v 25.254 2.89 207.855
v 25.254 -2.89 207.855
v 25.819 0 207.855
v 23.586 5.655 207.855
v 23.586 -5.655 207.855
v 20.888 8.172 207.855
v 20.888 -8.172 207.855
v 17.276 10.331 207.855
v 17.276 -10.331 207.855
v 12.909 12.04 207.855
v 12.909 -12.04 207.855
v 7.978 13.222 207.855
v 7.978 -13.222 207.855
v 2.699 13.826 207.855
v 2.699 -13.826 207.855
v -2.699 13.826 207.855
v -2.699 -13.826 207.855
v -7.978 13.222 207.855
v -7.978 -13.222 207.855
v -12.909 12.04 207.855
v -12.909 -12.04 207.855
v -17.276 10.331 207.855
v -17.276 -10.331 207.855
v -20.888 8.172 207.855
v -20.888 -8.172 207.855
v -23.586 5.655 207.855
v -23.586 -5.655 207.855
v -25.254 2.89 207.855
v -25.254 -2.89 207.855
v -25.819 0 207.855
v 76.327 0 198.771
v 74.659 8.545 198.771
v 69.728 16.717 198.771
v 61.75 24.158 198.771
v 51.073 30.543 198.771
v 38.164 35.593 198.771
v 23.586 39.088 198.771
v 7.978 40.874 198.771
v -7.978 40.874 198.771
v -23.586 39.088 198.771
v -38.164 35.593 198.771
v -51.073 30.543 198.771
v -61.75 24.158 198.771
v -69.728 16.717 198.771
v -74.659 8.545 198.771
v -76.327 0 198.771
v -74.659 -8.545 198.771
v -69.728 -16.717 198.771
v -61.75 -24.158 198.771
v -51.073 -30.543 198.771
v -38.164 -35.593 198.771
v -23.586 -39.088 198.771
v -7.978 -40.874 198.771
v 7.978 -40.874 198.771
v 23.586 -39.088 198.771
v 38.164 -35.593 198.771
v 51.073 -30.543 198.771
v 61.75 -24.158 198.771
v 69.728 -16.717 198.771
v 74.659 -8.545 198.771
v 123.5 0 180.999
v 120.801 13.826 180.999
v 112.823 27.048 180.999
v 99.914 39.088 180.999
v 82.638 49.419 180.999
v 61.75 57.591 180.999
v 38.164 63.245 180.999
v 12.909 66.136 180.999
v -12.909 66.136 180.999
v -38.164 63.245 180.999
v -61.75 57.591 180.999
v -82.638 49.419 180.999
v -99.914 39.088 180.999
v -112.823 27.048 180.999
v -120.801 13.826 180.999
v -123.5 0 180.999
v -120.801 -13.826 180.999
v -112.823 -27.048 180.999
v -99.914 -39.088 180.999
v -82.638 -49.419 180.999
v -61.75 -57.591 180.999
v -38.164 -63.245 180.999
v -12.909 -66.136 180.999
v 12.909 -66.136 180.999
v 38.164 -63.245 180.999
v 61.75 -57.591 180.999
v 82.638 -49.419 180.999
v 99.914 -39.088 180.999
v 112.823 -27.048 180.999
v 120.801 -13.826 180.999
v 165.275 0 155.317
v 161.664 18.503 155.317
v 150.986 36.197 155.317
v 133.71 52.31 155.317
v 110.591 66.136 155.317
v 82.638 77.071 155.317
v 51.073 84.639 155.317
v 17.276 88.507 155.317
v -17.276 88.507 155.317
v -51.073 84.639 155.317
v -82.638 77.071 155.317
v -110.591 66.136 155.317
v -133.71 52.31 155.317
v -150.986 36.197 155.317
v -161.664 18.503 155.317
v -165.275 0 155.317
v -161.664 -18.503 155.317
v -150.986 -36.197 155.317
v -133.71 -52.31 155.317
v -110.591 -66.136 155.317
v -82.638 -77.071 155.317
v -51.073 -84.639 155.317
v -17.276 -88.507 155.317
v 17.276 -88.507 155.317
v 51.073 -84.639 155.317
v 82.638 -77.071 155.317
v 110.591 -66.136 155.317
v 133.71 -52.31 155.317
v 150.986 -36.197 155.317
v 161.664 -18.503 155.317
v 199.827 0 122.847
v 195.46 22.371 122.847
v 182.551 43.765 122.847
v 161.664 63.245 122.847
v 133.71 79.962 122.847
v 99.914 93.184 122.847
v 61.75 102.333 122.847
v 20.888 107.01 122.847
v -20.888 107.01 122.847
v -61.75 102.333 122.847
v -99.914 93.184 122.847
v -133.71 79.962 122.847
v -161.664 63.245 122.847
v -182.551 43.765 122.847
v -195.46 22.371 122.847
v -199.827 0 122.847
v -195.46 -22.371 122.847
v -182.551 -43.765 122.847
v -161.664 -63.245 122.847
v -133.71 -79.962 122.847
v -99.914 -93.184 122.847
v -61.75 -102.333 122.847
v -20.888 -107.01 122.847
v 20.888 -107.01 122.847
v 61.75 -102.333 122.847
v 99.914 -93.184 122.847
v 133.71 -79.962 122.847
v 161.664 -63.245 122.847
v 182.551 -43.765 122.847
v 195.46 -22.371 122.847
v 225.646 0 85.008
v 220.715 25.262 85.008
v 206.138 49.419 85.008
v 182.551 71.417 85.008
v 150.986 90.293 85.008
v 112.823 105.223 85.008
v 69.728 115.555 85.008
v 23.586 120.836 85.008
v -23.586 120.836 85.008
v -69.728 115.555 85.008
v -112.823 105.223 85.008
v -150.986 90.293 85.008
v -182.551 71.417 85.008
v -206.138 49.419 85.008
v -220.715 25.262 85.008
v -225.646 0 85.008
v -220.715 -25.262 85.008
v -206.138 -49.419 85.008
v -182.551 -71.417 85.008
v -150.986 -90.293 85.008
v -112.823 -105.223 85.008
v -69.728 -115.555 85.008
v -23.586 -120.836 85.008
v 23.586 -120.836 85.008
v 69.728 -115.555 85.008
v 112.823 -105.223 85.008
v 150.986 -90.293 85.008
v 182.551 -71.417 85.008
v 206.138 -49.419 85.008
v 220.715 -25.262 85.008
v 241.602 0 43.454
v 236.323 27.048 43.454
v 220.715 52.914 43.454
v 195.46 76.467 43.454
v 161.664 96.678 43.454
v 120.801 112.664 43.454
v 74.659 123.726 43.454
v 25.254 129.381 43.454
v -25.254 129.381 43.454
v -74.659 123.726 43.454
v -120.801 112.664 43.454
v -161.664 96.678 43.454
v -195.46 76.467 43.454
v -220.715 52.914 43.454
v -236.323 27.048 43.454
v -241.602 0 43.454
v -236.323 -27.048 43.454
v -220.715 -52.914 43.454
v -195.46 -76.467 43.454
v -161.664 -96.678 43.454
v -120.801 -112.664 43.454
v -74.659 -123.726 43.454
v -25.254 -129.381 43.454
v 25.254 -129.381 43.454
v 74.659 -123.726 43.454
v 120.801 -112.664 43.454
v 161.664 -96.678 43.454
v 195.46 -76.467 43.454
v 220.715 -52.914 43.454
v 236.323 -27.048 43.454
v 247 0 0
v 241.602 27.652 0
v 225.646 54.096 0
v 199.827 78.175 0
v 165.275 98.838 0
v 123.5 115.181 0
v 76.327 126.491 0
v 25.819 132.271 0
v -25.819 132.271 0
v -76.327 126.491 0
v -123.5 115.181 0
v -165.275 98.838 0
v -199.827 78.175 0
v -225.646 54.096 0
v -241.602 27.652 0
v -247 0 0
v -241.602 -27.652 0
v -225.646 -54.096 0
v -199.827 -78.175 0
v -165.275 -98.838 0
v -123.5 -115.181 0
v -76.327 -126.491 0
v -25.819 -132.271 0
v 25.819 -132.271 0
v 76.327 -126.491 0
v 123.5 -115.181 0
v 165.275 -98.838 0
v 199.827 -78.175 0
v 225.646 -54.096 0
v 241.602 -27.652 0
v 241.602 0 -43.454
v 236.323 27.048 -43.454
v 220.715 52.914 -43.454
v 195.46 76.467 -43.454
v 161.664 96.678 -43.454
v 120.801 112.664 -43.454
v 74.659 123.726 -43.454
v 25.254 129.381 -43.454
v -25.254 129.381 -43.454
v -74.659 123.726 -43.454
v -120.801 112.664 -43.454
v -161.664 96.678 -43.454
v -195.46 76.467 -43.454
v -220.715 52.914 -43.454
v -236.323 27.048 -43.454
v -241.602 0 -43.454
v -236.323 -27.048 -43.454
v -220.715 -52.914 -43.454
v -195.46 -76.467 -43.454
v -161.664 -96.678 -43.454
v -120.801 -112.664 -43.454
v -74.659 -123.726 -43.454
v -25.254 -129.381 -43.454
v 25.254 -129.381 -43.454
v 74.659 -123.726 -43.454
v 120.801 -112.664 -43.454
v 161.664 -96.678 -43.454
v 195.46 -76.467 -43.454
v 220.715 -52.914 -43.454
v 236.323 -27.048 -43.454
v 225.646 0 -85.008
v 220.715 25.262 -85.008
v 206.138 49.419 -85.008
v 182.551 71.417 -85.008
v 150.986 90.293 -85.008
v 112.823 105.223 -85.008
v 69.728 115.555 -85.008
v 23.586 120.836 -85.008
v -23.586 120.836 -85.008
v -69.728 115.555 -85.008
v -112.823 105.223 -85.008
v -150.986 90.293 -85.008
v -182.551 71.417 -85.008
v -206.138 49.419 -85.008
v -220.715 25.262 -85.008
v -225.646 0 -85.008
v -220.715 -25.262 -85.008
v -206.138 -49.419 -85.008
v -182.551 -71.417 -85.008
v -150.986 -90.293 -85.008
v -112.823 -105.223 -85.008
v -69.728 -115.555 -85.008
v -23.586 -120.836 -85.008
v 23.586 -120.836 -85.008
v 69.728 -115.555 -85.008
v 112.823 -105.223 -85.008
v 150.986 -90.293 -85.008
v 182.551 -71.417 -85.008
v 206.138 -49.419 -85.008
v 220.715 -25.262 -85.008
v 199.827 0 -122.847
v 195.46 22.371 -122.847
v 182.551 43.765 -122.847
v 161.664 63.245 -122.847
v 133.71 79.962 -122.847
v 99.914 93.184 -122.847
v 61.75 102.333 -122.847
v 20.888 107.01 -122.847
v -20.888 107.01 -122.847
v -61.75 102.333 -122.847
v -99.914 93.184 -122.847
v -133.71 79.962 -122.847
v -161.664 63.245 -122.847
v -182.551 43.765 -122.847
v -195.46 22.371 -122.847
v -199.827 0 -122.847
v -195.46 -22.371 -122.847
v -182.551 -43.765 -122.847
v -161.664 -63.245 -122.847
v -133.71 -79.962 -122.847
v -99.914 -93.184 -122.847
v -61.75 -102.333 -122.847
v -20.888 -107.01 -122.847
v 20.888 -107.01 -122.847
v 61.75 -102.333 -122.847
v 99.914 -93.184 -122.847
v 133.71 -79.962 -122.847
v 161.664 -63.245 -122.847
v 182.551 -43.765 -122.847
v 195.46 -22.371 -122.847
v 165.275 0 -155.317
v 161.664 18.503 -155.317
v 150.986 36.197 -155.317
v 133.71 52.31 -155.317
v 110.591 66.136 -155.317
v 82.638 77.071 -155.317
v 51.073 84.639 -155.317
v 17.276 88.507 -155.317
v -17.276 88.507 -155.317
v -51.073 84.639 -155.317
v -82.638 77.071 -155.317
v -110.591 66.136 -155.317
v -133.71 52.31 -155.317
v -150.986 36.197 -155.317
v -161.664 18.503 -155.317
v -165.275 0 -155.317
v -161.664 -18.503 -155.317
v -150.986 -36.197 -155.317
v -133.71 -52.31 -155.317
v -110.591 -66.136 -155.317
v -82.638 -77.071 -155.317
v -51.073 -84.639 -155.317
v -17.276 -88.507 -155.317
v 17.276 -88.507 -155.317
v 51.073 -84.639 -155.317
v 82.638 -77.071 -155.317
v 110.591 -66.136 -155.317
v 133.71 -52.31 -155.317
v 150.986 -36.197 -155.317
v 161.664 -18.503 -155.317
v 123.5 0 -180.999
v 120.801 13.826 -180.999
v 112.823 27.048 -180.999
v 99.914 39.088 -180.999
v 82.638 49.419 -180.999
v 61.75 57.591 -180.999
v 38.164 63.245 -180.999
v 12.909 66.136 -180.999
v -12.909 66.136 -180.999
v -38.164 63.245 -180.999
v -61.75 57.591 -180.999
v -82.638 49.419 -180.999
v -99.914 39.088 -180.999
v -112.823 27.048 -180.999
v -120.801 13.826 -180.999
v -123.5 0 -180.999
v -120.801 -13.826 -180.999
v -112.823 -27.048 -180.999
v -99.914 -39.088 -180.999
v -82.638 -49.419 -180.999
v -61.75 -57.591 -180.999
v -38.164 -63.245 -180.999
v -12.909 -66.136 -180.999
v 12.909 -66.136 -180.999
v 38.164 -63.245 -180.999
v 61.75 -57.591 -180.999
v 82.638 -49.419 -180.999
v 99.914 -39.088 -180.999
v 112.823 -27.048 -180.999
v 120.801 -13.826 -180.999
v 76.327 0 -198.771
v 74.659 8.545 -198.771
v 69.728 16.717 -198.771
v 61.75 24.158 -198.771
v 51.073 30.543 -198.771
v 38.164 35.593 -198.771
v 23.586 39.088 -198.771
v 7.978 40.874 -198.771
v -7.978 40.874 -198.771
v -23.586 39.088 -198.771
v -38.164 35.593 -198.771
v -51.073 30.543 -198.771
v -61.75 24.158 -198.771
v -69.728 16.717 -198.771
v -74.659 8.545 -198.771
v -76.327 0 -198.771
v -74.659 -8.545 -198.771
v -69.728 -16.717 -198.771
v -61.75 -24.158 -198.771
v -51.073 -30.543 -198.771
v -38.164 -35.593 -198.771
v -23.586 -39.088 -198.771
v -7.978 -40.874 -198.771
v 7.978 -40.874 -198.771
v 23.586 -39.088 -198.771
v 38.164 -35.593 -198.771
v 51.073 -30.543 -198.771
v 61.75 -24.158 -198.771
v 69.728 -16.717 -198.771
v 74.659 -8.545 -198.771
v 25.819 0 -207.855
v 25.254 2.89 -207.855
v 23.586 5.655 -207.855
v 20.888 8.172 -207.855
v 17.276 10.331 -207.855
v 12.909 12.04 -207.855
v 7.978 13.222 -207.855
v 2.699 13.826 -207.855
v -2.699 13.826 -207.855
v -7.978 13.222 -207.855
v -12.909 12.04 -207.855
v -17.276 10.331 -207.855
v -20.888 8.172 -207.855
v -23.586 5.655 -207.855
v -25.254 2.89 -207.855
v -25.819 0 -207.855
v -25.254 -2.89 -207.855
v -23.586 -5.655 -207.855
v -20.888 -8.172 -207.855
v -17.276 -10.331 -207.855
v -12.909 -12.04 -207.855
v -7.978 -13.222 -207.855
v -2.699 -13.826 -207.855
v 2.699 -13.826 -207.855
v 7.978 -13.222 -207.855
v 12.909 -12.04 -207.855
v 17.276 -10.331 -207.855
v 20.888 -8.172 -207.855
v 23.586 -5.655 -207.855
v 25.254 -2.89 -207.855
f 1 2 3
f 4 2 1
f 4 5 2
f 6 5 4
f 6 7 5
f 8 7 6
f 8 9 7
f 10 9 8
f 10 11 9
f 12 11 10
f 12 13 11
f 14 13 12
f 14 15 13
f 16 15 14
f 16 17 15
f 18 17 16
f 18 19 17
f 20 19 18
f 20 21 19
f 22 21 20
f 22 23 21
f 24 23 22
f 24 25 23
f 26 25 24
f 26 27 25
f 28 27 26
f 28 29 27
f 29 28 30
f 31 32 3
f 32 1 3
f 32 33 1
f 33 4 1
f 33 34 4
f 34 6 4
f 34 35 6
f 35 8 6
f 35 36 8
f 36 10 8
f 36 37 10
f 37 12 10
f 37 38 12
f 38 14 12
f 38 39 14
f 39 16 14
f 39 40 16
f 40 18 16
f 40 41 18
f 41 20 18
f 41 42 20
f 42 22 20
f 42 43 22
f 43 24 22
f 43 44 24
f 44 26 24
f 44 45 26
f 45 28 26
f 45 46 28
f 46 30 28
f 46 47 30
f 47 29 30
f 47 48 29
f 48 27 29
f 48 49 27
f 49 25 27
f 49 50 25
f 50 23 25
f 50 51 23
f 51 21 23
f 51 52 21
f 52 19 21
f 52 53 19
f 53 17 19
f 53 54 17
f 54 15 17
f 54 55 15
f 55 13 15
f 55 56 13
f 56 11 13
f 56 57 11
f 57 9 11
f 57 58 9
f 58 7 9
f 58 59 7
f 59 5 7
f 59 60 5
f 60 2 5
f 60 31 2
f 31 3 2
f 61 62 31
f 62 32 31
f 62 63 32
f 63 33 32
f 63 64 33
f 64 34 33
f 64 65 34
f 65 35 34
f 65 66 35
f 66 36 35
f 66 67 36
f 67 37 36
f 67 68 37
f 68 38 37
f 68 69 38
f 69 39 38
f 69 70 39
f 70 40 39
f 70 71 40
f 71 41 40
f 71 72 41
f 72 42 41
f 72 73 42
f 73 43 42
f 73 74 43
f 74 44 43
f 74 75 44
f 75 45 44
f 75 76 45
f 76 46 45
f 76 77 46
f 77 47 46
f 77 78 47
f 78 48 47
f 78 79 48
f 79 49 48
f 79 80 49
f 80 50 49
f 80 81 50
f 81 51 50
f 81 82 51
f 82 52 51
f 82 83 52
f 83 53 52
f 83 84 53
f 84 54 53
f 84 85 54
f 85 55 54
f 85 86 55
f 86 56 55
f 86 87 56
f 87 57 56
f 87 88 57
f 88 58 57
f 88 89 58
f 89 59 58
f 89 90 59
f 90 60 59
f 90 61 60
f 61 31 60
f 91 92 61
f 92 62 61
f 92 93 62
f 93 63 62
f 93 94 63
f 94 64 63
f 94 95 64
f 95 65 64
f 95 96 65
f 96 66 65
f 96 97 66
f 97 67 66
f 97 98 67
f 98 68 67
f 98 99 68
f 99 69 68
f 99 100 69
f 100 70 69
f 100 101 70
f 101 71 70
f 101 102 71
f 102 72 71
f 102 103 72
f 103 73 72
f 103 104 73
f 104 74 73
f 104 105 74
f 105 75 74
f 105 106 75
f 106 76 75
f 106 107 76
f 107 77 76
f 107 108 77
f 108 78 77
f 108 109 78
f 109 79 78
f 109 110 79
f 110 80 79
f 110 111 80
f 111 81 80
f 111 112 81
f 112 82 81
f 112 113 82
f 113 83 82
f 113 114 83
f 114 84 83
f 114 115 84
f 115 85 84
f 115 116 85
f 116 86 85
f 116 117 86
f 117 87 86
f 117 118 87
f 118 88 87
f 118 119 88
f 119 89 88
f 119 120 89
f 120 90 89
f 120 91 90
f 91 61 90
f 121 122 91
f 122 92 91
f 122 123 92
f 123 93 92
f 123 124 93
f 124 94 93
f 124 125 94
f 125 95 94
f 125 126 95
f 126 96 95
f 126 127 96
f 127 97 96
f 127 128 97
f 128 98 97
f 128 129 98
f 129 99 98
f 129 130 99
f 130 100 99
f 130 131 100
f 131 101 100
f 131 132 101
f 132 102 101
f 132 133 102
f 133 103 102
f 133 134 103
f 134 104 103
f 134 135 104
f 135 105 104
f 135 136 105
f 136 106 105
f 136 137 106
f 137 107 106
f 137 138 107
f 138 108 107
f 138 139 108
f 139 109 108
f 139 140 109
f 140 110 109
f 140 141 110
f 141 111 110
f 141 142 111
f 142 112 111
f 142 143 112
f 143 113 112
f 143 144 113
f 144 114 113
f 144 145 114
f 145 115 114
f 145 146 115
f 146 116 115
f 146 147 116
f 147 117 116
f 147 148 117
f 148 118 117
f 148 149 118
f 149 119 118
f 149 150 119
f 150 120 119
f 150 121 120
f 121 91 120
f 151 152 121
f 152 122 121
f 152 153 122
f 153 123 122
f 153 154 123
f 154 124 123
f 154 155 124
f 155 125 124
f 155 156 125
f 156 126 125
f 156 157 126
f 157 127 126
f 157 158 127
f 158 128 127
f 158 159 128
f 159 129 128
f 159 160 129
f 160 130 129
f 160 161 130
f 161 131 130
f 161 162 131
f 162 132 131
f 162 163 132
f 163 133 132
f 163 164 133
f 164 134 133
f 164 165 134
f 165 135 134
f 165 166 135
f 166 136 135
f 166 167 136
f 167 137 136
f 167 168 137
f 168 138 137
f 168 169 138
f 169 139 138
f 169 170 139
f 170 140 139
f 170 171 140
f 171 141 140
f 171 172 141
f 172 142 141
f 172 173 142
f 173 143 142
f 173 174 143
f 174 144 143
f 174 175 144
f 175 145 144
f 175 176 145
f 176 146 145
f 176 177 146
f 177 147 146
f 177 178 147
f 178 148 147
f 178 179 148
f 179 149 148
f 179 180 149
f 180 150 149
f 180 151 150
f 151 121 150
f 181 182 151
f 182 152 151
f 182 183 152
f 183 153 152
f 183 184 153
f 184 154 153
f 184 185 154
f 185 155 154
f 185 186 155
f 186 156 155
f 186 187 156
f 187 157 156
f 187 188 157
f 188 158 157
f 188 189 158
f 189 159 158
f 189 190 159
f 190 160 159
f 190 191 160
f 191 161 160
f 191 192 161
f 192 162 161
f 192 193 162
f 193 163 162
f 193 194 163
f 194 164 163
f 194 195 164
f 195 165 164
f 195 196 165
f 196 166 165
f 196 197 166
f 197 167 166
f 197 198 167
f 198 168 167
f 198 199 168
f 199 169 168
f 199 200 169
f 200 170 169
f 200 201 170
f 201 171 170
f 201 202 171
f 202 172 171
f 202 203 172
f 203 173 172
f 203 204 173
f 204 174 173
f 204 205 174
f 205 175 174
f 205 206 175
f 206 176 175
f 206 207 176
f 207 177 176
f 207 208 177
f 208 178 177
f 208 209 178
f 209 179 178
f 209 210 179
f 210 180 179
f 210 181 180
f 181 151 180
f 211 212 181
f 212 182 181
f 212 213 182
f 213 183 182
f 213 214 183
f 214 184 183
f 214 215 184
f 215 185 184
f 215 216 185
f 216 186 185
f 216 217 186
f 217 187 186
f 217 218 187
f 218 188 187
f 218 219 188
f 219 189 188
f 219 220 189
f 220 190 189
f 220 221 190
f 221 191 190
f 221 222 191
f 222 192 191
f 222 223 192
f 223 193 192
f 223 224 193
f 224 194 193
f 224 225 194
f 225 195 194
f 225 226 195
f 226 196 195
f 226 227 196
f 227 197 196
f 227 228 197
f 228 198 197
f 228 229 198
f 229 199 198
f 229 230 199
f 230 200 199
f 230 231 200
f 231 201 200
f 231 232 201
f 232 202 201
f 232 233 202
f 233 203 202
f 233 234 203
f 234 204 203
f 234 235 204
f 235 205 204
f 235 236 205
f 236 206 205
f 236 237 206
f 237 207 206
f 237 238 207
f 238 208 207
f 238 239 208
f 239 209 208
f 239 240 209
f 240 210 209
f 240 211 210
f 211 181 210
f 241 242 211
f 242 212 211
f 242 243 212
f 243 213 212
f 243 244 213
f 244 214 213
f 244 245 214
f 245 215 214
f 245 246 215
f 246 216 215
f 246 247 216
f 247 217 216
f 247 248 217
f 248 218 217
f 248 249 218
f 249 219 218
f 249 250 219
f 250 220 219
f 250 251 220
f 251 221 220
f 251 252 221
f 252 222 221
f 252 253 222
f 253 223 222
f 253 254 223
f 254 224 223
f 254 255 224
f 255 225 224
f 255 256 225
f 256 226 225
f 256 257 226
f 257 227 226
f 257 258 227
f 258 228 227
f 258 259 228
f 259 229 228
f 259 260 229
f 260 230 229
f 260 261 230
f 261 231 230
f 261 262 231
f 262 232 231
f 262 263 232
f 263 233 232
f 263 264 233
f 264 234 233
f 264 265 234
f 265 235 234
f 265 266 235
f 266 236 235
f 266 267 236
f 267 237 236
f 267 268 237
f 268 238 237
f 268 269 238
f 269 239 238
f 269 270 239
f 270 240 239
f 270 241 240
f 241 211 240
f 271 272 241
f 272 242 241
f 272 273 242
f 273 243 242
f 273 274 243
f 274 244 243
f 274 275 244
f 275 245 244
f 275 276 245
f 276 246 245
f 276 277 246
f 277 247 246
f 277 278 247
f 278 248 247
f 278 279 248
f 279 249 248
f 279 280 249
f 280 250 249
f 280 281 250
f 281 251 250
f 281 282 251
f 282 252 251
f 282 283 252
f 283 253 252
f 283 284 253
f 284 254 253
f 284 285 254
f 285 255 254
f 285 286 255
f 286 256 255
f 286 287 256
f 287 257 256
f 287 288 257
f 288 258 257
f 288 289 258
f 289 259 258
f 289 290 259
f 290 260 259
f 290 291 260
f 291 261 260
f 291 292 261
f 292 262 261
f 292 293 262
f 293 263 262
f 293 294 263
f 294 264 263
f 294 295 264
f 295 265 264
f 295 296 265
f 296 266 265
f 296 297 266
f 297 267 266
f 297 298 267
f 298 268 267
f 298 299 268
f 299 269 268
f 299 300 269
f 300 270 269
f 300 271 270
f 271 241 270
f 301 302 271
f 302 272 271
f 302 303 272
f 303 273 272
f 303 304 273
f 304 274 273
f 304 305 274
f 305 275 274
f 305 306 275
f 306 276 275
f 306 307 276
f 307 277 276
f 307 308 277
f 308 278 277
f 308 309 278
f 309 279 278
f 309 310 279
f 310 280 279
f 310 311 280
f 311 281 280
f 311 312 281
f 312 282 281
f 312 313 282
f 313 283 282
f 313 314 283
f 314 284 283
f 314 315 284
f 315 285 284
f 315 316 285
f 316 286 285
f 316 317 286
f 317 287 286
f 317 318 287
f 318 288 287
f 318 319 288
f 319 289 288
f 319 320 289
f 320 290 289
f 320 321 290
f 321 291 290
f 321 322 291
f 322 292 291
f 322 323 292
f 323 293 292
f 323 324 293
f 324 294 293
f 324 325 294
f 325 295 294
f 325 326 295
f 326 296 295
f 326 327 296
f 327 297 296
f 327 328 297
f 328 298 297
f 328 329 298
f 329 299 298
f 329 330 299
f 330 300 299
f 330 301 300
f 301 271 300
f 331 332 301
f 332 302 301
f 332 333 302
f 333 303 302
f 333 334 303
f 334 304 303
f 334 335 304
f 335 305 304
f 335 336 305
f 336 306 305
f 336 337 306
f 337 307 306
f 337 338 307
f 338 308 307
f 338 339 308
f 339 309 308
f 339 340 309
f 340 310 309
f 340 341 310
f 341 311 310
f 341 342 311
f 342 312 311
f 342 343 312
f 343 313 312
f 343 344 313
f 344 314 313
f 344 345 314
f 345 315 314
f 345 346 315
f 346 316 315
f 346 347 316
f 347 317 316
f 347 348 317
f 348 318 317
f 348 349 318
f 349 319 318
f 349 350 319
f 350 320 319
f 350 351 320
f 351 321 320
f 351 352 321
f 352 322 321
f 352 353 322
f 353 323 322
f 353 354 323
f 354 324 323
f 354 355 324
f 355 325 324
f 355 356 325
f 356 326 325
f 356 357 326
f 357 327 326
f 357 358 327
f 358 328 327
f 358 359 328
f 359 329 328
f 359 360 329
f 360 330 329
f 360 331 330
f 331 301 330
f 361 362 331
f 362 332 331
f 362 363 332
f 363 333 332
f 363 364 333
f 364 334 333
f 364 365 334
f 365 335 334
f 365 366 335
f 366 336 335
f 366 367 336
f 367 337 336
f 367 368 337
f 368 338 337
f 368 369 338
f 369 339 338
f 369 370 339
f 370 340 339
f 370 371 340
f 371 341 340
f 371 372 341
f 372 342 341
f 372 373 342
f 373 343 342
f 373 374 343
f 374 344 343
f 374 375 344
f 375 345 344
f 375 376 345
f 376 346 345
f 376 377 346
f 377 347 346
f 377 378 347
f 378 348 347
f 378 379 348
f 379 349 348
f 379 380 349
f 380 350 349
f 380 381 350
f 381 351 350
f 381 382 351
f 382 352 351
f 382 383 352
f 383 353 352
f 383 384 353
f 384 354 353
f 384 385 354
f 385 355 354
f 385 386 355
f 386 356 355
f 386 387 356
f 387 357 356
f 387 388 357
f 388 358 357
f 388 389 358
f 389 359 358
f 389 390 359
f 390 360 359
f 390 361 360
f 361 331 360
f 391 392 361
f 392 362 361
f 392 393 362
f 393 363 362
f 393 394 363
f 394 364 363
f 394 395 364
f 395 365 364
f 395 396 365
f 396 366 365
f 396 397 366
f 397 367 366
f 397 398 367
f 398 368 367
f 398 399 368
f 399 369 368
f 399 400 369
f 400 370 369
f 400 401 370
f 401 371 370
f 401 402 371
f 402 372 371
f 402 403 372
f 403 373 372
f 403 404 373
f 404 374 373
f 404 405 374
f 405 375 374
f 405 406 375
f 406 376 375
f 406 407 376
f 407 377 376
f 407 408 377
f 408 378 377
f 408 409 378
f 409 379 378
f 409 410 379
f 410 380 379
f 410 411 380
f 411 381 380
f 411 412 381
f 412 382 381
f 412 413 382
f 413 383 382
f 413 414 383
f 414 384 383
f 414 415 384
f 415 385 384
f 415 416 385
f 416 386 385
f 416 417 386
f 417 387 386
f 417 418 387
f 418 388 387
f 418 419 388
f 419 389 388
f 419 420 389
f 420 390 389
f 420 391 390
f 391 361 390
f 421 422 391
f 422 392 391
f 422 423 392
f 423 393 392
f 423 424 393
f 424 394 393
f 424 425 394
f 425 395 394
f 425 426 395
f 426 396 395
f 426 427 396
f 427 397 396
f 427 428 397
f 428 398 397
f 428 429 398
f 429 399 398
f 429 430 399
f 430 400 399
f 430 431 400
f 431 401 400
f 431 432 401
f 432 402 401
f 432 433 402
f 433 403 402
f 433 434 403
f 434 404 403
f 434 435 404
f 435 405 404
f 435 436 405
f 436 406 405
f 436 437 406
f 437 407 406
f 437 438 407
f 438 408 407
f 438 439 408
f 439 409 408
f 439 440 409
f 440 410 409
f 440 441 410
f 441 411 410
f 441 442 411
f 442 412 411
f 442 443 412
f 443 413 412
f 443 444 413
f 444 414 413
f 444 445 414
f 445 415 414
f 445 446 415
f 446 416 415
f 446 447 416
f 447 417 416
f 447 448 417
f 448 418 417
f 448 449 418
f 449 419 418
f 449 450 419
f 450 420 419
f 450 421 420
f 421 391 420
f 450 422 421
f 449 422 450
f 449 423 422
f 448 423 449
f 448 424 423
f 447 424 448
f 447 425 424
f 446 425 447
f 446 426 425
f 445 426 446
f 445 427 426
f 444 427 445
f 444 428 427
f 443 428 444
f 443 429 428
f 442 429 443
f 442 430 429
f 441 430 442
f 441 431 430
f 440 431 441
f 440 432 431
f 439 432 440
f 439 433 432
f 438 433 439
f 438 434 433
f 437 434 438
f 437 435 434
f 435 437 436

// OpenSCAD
// Generated by SolidPython 1.0.1 on 2020-07-29 00:46:50


scale(v = [13, 7, 11]) {
	sphere(r = 19);
}
/***********************************************
*********      SolidPython code:      **********
************************************************
 
# import packages: SolidPython
from solid import *
from solid.utils import *
from itertools import chain, combinations, permutations


class Resize:

    def __init__(self, scad_file):
        self.scad_file = scad_file
        #self.scad_file = import_scad(scad_file)
        # cone/cylinder param:
        self.r1 = 0
        self.r2 = 0
        self.h = 0
        # rectangular prism param:
        self.w = 0
        self.l = 0
        # ellipse param:
        self.r = 0

    # import OpenScad code (file name corresponds to shape)


    # classify shape + parameters
    def assign(self, param1, param2, param3):
        if self.scad_file == 'cone.scad':
            self.r1 = param1
            self.r2 = param2
            self.h = param3
        elif self.scad_file == 'cylinder.scad':
            self.r1 = param1
            self.r2 = param2
            self.h = param3
        elif self.scad_file == 'rectangularPrism.scad':
            self.h = param1
            self.l = param2
            self.w = param3
        else:
            self.r = param1
            self.h = param2

    # resize parameters
    def iterate(self):
        x = range(3, 20, 2)
        i = 1
        if self.scad_file == 'cone.scad':
            tempList = list(permutations(x, 2))
            for temp in tempList:
                param1 = temp[0]
                param2 = temp[1]
                filepath = 'produced_scad_files/' + 'cone' + str(param1) + '_' + str(param2) + '_' + '.scad'
                scad_render_to_file(cylinder(h=param1, r1=param2, r2=0), filepath)

        elif self.scad_file == 'cylinder.scad':
            tempList = list(permutations(x, 3))
            for temp in tempList:
                param1 = temp[0]
                param2 = temp[1]
                filepath = 'produced_scad_files/' + 'cylinder' + str(param1) + '_' + str(param2) + '_' + '.scad'
                scad_render_to_file(cylinder(h=param1, r1=param2, r2=param2), filepath)

        elif self.scad_file == 'rectangularPrism.scad':
            tempList = list(permutations(x, 3))
            for temp in tempList:
                param1 = temp[0]
                param2 = temp[1]
                param3 = temp[2]
                filepath = 'produced_scad_files/' + 'rectangularPrism' + str(param1) + '_' + str(param2) + '_' + str(
                    param3) + '.scad'
                scad_render_to_file(cube(size=(param1, param2, param3)), filepath)

        elif self.scad_file == 'ellipse.scad':
            tempList = list(permutations(x, 4))
            for temp in tempList:
                param1 = temp[0]
                param2 = temp[1]
                param3 = temp[2]
                param4 = temp[3]
                filepath = 'produced_scad_files/' + 'ellipse' + str(param1) + '_' + str(param2) + '_' + str(param3) + '_' + str(param4) + '.scad'
                scad_render_to_file(scale([param1, param2, param3])(sphere(r=param4)), filepath)

    def render_to_scadfile(self):
        scad_render_to_file(scad, 'example.scad') 
 
************************************************/
